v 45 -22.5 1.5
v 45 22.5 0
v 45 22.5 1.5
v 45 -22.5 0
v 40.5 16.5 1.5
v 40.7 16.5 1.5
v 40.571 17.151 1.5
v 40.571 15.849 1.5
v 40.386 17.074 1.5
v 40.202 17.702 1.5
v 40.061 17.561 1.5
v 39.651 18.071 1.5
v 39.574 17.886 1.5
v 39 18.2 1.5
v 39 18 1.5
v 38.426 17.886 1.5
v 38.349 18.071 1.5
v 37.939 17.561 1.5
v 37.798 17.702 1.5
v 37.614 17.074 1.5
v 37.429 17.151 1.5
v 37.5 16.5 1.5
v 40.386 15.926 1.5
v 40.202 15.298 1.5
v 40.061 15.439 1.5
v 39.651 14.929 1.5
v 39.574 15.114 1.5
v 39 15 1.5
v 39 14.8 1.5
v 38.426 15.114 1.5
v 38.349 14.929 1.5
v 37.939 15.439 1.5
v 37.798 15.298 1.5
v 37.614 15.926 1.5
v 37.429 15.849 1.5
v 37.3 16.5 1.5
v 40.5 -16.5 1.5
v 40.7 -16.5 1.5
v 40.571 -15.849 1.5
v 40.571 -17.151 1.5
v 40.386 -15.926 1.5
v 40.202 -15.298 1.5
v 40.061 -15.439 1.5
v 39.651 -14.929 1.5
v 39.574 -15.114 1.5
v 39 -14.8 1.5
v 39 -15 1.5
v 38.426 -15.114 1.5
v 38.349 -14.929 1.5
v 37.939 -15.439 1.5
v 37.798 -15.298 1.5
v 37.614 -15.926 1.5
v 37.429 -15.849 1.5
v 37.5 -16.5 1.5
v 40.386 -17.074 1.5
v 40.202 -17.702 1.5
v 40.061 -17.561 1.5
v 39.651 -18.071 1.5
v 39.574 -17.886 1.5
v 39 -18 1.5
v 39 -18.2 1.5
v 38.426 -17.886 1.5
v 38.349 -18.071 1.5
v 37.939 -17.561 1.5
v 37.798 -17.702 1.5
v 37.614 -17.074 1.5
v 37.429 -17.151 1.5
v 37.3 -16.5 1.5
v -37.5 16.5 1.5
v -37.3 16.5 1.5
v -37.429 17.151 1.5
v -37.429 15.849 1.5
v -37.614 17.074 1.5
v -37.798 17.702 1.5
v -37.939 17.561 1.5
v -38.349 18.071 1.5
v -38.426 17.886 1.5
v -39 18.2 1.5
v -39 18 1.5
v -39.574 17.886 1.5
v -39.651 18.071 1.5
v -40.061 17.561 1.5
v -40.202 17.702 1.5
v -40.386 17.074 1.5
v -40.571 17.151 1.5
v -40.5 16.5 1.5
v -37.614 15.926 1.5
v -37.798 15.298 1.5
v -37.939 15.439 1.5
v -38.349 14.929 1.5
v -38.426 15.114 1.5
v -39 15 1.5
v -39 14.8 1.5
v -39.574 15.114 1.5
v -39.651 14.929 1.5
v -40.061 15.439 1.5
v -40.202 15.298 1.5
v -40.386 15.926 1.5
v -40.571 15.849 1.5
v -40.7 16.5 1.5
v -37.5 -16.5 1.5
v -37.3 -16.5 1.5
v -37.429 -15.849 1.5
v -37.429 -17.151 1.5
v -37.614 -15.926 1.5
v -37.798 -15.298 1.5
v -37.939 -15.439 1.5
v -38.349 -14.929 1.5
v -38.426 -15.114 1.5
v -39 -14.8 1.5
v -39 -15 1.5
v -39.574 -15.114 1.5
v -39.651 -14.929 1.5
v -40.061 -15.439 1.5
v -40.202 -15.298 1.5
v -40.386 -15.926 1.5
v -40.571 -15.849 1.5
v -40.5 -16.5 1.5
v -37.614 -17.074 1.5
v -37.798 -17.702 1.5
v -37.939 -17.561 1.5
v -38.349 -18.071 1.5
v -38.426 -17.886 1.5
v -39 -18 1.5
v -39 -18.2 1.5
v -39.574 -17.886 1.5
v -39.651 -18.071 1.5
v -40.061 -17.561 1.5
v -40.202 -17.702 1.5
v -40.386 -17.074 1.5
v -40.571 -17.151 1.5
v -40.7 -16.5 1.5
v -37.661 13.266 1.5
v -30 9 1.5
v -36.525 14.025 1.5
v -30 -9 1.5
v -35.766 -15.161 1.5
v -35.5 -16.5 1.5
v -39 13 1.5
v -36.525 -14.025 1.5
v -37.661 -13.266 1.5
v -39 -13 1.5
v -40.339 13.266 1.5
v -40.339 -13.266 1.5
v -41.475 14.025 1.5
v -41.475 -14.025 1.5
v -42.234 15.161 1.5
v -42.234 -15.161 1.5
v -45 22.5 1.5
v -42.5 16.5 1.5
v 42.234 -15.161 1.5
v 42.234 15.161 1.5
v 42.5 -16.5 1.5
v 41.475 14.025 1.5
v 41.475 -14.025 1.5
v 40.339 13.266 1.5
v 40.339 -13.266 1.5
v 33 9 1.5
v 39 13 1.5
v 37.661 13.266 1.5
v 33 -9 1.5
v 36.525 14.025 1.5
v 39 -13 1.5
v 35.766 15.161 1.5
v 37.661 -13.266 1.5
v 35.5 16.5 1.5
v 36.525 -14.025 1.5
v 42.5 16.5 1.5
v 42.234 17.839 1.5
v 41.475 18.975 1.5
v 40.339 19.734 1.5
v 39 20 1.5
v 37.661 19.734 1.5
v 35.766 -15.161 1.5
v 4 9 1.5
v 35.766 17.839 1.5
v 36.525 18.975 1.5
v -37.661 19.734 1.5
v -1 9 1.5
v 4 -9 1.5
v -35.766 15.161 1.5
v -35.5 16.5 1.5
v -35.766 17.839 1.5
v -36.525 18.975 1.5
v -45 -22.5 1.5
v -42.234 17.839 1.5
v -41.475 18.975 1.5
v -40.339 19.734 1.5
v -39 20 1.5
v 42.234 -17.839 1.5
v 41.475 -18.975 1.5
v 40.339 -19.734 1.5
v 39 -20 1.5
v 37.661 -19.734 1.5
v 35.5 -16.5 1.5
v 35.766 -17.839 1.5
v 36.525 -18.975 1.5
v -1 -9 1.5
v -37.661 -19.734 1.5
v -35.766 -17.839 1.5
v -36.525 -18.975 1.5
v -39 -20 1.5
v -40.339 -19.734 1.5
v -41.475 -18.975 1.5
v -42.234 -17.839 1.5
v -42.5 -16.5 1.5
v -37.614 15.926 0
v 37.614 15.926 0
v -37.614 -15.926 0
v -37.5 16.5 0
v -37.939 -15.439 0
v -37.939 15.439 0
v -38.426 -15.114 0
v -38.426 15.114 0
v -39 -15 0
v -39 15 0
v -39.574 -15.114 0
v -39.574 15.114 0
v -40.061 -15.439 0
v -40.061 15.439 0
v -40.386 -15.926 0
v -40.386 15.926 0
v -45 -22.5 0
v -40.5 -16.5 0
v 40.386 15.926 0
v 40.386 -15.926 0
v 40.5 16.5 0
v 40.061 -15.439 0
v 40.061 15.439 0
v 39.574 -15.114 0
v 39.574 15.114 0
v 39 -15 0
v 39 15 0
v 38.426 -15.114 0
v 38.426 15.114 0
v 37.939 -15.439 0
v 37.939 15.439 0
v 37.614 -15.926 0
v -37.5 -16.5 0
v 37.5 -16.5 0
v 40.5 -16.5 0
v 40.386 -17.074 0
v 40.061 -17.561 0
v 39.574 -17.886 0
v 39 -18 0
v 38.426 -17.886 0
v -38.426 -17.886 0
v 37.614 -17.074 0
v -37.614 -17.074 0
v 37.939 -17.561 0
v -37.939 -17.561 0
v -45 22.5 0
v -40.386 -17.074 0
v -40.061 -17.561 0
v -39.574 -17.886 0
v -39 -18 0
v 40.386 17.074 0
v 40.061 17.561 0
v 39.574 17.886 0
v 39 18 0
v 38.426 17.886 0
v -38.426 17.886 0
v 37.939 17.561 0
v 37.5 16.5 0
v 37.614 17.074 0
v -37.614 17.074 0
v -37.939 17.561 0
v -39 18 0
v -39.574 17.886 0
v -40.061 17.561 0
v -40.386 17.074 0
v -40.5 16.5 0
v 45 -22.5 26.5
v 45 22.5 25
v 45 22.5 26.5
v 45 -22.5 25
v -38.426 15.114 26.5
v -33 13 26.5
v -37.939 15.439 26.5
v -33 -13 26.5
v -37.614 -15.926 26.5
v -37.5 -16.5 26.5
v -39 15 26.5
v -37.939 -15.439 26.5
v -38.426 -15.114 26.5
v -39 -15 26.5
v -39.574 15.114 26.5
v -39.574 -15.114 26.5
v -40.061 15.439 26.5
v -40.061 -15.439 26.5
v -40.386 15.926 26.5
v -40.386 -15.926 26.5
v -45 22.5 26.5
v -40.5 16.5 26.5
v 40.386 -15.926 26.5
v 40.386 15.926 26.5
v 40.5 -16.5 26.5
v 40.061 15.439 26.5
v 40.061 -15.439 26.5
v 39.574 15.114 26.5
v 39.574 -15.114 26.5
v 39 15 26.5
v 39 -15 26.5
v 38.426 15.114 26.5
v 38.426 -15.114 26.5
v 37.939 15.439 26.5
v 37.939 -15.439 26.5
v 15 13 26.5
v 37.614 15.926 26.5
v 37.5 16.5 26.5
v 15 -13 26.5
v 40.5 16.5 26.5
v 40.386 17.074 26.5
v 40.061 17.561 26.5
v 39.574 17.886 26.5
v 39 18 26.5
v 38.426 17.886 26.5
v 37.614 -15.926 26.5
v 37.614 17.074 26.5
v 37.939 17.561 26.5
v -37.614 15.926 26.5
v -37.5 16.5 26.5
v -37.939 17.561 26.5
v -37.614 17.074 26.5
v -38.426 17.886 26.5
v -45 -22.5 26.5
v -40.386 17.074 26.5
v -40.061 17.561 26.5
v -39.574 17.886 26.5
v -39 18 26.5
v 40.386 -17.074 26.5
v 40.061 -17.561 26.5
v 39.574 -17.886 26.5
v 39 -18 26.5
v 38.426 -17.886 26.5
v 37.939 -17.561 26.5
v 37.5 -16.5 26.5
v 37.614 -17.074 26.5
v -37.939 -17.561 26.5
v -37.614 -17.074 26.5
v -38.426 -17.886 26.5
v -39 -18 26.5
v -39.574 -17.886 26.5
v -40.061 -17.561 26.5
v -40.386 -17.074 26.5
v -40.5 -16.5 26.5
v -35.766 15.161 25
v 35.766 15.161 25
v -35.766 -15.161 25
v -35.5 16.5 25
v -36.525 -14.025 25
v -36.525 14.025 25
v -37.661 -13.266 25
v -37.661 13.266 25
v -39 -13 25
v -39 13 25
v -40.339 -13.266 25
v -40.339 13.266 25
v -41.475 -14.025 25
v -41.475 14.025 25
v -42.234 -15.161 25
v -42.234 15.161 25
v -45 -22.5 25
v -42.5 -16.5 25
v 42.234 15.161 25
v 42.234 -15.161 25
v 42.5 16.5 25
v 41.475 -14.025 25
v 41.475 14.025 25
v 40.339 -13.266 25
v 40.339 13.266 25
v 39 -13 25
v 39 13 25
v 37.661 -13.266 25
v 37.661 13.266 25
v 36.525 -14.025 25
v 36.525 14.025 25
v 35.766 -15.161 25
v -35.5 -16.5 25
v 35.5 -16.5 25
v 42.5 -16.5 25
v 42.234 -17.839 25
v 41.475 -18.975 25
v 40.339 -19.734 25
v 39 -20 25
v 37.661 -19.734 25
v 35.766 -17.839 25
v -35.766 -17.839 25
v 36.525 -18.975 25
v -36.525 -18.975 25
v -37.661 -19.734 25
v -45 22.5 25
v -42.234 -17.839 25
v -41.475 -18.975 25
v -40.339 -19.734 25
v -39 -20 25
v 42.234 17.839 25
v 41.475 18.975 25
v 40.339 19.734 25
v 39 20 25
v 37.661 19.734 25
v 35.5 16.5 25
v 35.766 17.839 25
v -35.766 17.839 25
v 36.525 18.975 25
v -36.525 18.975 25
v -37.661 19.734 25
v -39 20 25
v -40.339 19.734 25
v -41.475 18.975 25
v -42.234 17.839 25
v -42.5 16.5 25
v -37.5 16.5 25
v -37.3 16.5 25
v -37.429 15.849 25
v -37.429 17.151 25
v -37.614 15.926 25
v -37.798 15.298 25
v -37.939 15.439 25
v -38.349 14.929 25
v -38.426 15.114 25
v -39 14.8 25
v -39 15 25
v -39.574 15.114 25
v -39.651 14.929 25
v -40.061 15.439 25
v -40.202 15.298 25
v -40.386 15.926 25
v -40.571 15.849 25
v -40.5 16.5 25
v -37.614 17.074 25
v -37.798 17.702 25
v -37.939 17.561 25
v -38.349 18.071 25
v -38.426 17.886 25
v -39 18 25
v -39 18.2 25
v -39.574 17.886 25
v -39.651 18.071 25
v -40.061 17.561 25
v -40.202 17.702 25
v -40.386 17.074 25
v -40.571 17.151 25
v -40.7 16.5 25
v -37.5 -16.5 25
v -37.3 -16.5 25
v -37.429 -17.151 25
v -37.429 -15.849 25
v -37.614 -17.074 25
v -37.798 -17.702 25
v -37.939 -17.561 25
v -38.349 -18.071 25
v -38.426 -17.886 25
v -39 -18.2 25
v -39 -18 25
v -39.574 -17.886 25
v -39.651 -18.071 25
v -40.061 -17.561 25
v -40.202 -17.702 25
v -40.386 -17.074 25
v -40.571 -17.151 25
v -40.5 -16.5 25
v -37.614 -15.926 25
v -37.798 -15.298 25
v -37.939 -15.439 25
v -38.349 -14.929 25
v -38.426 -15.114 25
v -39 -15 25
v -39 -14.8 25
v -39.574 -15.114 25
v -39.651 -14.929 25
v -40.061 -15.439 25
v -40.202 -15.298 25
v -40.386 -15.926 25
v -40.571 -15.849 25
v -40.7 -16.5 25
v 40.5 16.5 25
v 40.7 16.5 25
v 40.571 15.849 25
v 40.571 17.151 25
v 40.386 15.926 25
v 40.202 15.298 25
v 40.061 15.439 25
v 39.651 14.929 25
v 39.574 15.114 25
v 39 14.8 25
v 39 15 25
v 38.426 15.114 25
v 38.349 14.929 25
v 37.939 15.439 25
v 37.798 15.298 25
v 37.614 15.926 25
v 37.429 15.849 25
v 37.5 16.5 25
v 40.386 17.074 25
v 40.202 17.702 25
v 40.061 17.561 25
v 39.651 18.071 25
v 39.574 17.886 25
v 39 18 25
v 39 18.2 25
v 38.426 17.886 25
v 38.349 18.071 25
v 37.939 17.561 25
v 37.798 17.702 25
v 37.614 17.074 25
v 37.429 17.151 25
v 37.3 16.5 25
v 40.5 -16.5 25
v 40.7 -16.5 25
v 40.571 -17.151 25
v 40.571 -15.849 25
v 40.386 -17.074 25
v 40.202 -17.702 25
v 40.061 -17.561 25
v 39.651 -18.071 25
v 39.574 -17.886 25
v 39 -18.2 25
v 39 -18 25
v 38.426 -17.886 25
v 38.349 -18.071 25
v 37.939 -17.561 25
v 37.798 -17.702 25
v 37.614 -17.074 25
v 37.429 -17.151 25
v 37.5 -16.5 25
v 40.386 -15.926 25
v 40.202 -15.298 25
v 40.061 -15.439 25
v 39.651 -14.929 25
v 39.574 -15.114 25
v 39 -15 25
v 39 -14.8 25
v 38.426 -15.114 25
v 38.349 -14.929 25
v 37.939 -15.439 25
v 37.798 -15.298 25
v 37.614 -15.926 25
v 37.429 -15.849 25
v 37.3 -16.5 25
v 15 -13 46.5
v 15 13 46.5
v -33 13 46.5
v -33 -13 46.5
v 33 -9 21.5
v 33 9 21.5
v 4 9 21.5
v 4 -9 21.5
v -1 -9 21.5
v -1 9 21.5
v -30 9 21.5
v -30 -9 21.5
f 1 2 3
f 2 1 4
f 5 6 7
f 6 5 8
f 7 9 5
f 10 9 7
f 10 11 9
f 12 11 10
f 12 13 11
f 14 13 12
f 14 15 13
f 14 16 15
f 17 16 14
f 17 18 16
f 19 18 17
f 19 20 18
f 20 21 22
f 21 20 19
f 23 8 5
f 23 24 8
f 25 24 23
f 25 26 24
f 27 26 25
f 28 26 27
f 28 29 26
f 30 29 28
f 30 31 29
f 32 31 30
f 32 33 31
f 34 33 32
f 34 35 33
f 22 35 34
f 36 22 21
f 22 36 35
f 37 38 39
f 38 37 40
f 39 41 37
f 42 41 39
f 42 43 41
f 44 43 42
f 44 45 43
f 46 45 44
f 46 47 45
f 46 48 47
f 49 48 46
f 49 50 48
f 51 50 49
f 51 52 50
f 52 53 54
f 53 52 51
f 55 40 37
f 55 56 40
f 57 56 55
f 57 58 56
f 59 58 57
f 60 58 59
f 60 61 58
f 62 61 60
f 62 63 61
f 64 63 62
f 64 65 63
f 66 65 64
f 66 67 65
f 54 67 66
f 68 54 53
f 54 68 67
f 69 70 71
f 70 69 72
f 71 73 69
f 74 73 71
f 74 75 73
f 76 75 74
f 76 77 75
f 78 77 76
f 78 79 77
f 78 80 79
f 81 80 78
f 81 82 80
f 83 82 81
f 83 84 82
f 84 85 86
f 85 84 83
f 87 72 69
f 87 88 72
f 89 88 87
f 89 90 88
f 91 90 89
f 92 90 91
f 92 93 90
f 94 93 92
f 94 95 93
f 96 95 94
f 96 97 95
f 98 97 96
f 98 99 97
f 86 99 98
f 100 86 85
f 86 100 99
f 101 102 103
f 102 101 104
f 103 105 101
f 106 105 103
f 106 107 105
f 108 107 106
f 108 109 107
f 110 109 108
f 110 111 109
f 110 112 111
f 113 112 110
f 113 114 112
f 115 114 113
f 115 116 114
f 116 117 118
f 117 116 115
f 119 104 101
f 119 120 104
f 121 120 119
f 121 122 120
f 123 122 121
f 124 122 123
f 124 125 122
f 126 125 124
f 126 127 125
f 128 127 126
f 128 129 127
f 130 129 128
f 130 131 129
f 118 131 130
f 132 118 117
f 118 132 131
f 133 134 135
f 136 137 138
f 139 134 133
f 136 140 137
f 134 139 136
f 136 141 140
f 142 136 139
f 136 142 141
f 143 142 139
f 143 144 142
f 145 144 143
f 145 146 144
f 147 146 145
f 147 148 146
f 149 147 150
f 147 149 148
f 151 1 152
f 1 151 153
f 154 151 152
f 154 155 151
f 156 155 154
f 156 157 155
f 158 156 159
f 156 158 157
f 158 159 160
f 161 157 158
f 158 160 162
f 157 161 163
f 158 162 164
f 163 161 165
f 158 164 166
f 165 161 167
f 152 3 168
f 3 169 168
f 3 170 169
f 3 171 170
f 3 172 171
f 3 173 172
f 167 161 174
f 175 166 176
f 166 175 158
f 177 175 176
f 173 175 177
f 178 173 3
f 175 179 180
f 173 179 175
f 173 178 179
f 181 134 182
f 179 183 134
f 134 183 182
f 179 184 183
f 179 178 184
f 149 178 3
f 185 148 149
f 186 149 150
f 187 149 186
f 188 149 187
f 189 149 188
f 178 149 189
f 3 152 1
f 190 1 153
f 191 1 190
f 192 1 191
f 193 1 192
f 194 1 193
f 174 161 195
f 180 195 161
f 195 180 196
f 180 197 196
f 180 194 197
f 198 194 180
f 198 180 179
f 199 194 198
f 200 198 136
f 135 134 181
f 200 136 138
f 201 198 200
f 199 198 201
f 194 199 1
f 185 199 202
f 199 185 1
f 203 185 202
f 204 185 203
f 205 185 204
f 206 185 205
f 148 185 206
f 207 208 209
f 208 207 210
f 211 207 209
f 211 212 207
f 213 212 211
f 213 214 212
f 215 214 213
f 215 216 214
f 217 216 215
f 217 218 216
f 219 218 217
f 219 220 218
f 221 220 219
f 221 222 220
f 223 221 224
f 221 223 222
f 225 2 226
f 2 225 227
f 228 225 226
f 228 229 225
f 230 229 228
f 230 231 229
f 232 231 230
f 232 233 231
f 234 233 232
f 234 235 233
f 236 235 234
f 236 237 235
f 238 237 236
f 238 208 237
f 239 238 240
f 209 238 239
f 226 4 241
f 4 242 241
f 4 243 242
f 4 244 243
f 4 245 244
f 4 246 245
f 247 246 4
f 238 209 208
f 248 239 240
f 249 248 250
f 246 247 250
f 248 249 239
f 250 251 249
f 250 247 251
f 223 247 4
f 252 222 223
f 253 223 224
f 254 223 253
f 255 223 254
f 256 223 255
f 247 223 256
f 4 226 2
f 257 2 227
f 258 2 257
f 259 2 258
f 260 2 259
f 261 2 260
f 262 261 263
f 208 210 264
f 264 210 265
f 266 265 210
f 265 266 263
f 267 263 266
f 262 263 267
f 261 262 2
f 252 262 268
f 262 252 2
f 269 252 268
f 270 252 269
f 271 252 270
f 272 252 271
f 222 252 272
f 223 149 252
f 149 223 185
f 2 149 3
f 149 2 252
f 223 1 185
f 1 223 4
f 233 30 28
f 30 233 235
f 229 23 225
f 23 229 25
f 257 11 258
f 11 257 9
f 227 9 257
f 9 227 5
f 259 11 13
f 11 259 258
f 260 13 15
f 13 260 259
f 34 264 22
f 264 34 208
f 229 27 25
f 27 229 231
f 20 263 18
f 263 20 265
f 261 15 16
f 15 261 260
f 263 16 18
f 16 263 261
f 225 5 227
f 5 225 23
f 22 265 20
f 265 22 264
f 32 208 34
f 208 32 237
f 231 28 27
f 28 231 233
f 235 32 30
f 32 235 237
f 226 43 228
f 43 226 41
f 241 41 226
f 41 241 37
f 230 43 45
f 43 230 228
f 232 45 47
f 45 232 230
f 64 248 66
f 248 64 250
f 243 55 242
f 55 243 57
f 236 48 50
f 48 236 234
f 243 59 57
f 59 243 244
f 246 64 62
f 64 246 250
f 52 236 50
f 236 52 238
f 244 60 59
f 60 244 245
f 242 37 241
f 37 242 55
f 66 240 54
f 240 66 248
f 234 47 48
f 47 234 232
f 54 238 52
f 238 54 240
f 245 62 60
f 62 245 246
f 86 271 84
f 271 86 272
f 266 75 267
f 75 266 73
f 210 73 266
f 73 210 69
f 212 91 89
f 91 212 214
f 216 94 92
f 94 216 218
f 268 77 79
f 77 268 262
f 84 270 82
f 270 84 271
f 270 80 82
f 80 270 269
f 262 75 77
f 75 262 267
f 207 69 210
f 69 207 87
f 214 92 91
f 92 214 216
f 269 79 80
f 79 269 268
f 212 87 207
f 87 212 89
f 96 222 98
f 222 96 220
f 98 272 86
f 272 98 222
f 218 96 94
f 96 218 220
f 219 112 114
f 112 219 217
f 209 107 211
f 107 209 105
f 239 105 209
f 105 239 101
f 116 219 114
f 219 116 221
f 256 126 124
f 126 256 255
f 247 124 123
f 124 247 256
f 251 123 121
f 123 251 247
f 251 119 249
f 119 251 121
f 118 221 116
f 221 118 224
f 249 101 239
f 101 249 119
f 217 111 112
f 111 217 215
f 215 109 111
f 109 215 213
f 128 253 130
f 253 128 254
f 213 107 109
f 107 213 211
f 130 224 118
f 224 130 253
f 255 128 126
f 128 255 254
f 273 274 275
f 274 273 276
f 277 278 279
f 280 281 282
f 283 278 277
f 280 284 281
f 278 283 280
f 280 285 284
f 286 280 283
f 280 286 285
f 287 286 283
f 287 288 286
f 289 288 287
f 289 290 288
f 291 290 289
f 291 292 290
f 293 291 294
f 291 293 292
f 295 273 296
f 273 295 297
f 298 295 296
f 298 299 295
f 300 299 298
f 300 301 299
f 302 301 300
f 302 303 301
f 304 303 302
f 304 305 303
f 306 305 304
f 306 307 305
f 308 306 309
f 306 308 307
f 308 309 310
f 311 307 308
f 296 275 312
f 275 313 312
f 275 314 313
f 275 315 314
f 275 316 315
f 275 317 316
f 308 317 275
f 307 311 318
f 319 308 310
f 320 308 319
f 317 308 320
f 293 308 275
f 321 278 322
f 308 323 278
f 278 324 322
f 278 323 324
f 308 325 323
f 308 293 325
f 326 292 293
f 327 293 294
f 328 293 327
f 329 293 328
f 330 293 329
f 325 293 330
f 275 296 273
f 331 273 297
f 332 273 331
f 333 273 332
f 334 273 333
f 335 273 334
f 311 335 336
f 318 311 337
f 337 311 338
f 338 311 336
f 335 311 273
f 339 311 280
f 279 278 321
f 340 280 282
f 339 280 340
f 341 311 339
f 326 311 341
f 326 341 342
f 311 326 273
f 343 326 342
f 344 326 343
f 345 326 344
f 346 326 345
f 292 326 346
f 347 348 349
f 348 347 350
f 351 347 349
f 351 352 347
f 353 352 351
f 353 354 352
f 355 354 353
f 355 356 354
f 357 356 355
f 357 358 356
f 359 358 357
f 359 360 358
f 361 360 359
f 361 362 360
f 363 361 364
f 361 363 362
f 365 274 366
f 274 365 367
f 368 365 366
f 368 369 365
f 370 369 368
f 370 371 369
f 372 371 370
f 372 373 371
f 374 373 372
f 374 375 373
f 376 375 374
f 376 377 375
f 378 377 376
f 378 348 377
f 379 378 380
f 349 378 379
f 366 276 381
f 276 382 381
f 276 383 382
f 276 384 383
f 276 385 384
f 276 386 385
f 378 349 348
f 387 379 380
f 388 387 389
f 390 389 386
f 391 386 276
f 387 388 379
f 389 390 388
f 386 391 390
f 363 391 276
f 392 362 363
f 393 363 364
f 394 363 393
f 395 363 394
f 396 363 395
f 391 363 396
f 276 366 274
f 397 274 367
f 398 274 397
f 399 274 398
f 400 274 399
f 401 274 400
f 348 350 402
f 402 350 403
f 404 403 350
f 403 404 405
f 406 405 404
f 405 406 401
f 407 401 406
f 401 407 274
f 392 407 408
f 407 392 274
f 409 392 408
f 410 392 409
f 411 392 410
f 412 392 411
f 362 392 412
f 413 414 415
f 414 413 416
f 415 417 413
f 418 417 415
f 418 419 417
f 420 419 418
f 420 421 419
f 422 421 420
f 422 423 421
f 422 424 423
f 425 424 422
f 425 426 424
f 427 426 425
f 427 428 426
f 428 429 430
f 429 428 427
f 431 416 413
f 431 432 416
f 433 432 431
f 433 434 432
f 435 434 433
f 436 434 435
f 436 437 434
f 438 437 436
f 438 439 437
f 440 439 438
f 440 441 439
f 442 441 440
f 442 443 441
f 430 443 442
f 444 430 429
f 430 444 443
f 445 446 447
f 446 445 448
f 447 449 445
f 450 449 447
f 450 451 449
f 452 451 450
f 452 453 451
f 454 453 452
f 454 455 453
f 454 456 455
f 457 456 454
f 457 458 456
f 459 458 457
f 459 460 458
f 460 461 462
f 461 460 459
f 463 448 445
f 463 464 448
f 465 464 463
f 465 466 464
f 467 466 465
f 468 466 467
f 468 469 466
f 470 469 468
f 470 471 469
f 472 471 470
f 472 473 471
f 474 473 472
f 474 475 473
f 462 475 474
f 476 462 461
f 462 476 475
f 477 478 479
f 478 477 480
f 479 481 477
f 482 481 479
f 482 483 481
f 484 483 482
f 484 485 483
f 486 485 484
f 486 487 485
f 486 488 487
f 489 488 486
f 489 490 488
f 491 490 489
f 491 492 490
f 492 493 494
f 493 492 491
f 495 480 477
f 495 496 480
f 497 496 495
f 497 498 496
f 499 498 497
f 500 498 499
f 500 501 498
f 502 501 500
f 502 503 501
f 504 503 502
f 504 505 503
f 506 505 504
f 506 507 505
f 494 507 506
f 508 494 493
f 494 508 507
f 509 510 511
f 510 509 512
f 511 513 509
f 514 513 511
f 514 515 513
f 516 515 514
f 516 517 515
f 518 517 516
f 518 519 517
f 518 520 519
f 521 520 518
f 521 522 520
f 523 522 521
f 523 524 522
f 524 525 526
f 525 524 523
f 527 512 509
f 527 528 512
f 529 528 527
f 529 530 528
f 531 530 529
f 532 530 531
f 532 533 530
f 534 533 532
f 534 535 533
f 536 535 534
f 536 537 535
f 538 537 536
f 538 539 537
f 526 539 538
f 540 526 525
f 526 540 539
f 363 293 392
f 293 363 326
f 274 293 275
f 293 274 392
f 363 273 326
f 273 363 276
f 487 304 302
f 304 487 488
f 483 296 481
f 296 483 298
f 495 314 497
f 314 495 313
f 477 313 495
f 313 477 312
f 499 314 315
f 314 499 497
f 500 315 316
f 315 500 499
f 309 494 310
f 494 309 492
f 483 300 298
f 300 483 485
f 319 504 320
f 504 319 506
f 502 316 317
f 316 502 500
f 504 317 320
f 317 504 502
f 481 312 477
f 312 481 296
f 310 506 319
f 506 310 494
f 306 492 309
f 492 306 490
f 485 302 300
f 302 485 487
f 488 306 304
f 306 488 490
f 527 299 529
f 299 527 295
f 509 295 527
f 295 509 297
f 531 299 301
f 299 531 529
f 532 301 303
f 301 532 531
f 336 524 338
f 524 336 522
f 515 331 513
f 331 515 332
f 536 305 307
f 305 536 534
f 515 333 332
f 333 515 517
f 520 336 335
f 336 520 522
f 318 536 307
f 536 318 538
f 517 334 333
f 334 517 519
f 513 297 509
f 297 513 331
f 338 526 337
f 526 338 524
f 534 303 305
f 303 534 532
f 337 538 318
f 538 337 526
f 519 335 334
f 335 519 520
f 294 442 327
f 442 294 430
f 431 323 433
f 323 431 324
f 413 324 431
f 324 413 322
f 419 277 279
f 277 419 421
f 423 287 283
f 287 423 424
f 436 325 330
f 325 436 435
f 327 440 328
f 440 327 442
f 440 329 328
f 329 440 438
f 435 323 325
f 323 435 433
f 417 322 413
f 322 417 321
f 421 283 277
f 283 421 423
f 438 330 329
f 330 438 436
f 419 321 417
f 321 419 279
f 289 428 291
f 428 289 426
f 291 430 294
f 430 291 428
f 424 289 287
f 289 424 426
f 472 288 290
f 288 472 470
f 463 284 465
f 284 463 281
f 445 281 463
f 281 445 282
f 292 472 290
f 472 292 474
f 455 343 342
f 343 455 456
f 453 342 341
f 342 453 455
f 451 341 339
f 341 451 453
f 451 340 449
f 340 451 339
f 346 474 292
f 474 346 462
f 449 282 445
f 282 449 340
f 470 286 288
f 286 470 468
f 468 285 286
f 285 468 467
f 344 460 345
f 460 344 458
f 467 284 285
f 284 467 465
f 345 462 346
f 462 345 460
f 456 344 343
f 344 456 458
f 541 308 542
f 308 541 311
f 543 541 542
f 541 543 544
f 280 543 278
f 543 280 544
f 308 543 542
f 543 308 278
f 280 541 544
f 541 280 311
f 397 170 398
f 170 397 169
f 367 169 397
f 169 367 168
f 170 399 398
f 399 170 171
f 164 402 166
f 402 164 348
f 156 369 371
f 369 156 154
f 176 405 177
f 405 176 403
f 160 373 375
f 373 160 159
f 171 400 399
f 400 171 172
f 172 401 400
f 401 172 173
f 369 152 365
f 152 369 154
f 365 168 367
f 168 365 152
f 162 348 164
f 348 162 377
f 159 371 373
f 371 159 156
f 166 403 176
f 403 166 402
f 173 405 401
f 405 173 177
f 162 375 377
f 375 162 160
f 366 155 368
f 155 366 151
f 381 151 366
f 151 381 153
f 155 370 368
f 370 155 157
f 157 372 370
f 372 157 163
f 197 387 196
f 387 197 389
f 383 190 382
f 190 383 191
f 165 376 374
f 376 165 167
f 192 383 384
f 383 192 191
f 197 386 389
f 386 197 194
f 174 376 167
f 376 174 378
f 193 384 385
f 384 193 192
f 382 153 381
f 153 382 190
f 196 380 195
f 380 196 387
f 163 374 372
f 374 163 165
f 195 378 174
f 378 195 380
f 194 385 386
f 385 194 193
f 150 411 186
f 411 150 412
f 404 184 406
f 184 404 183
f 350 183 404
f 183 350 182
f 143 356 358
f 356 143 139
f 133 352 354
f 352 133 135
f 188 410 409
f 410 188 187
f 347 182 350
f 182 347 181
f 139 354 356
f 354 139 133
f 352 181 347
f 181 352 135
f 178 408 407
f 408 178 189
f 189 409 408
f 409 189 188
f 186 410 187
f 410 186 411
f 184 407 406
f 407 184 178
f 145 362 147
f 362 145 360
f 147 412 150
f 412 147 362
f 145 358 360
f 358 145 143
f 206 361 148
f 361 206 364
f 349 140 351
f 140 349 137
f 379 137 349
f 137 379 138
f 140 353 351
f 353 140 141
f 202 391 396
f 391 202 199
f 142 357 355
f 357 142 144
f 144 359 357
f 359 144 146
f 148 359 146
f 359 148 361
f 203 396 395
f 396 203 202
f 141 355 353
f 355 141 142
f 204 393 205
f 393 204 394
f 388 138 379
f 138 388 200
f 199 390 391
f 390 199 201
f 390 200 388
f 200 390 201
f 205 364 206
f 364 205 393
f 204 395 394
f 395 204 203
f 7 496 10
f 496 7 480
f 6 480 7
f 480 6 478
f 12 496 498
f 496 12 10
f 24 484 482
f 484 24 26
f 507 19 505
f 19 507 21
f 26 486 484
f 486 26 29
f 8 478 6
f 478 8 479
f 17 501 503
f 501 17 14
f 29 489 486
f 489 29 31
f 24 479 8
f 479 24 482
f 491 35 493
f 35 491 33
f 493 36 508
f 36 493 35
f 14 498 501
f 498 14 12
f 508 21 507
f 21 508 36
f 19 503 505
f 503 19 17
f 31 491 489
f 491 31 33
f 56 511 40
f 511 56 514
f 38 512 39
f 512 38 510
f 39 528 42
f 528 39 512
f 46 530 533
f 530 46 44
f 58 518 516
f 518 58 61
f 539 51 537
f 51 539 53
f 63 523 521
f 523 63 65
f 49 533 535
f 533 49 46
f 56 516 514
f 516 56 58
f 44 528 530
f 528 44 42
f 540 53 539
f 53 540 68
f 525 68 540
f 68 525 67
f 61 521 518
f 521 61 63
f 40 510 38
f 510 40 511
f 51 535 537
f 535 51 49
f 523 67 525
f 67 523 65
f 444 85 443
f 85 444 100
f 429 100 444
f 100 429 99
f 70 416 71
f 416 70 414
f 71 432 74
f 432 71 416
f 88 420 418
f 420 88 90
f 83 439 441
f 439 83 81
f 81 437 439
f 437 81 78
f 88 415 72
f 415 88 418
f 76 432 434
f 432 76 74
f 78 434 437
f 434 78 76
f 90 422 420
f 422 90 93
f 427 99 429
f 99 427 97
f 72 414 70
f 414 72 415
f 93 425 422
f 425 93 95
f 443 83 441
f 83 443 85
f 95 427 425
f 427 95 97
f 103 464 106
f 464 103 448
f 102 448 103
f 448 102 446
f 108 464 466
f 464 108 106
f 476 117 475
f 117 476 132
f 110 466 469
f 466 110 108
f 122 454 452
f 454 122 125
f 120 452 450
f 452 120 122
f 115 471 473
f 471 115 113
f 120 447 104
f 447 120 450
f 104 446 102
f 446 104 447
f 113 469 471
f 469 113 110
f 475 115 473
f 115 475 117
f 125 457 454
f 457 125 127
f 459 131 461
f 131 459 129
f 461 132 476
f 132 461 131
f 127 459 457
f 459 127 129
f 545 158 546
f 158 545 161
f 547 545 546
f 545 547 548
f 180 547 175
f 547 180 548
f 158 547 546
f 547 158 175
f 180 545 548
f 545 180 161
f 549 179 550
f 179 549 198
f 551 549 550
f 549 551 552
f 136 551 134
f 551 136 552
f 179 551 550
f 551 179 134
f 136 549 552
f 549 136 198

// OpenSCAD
board_height=1.5;
hole=3;
size=2;

module elecboard(width,deep,security=0) {
    difference() {
        translate([0,0,board_height/2]) cube([width+2*security,deep+2*security,board_height],true);
        translate([width/2-2*hole,deep/2-2*hole,0]) cylinder(board_height,d=hole,$fn=16);
        translate([width/2-2*hole,-deep/2+2*hole,0]) cylinder(board_height,d=hole,$fn=16);
        translate([-width/2+2*hole,deep/2-2*hole,0]) cylinder(board_height,d=hole,$fn=16);
        translate([-width/2+2*hole,-deep/2+2*hole,0]) cylinder(board_height,d=hole,$fn=16);
    }
}

module entretoises(width,deep,height, security=0) {
    difference() {
        union() {
            translate([width/2-2*hole,deep/2-2*hole,0]) cylinder(height,d=hole+2*size,$fn=16);
            translate([width/2-2*hole,-deep/2+2*hole,0]) cylinder(height,d=hole+2*size,$fn=16);
            translate([-width/2+2*hole,deep/2-2*hole,0]) cylinder(height,d=hole+2*size,$fn=16);
            translate([-width/2+2*hole,-deep/2+2*hole,0]) cylinder(height,d=hole+2*size,$fn=16);
        }
        translate([width/2-2*hole,deep/2-2*hole,0]) cylinder(height,d=hole+2*security,$fn=16);
        translate([width/2-2*hole,-deep/2+2*hole,0]) cylinder(height,d=hole+2*security,$fn=16);
        translate([-width/2+2*hole,deep/2-2*hole,0]) cylinder(height,d=hole+2*security,$fn=16);
        translate([-width/2+2*hole,-deep/2+2*hole,0]) cylinder(height,d=hole+2*security,$fn=16);
    }
}


module board_screw(width,deep,height) {
    translate([width/2-2*hole,deep/2-2*hole,0]) cylinder(height,d=hole,$fn=16);
    translate([width/2-2*hole,-deep/2+2*hole,0]) cylinder(height,d=hole,$fn=16);
    translate([-width/2+2*hole,deep/2-2*hole,0]) cylinder(height,d=hole,$fn=16);
    translate([-width/2+2*hole,-deep/2+2*hole,0]) cylinder(height,d=hole,$fn=16);
}
module esp8266() {
    width=48;
    deep=26;
    height=20;
    translate([0,0,height/2]) cube([width,deep,height],true);
}

module dac() {
    width=29;
    deep=18;
    height=20;
    translate([0,0,height/2]) cube([width,deep,height],true);
}

module shift_register() {
    width=29;
    deep=35;
    height=20;
    translate([0,0,height/2]) cube([width,deep,height],true);
}


module board_esp8266(width,deep,security=0) {
    elecboard(width,deep,security);
    translate([-(width-48)/2+4*hole,0,board_height]) esp8266();
}


module board_dac(width,deep,security=0) {
    elecboard(width,deep,security);
    translate([(width-29)/2-4*hole,0,board_height]) dac();
    translate([(-width+35)/2+4*hole,0,board_height]) dac();
}

module boards(width,deep,security=0.2) {
    translate([0,0,25]) board_esp8266(width,deep);
    translate([0,0,board_height]) entretoises(width,deep,25,security);
    board_dac(width,deep);
}

boards(90,45);
